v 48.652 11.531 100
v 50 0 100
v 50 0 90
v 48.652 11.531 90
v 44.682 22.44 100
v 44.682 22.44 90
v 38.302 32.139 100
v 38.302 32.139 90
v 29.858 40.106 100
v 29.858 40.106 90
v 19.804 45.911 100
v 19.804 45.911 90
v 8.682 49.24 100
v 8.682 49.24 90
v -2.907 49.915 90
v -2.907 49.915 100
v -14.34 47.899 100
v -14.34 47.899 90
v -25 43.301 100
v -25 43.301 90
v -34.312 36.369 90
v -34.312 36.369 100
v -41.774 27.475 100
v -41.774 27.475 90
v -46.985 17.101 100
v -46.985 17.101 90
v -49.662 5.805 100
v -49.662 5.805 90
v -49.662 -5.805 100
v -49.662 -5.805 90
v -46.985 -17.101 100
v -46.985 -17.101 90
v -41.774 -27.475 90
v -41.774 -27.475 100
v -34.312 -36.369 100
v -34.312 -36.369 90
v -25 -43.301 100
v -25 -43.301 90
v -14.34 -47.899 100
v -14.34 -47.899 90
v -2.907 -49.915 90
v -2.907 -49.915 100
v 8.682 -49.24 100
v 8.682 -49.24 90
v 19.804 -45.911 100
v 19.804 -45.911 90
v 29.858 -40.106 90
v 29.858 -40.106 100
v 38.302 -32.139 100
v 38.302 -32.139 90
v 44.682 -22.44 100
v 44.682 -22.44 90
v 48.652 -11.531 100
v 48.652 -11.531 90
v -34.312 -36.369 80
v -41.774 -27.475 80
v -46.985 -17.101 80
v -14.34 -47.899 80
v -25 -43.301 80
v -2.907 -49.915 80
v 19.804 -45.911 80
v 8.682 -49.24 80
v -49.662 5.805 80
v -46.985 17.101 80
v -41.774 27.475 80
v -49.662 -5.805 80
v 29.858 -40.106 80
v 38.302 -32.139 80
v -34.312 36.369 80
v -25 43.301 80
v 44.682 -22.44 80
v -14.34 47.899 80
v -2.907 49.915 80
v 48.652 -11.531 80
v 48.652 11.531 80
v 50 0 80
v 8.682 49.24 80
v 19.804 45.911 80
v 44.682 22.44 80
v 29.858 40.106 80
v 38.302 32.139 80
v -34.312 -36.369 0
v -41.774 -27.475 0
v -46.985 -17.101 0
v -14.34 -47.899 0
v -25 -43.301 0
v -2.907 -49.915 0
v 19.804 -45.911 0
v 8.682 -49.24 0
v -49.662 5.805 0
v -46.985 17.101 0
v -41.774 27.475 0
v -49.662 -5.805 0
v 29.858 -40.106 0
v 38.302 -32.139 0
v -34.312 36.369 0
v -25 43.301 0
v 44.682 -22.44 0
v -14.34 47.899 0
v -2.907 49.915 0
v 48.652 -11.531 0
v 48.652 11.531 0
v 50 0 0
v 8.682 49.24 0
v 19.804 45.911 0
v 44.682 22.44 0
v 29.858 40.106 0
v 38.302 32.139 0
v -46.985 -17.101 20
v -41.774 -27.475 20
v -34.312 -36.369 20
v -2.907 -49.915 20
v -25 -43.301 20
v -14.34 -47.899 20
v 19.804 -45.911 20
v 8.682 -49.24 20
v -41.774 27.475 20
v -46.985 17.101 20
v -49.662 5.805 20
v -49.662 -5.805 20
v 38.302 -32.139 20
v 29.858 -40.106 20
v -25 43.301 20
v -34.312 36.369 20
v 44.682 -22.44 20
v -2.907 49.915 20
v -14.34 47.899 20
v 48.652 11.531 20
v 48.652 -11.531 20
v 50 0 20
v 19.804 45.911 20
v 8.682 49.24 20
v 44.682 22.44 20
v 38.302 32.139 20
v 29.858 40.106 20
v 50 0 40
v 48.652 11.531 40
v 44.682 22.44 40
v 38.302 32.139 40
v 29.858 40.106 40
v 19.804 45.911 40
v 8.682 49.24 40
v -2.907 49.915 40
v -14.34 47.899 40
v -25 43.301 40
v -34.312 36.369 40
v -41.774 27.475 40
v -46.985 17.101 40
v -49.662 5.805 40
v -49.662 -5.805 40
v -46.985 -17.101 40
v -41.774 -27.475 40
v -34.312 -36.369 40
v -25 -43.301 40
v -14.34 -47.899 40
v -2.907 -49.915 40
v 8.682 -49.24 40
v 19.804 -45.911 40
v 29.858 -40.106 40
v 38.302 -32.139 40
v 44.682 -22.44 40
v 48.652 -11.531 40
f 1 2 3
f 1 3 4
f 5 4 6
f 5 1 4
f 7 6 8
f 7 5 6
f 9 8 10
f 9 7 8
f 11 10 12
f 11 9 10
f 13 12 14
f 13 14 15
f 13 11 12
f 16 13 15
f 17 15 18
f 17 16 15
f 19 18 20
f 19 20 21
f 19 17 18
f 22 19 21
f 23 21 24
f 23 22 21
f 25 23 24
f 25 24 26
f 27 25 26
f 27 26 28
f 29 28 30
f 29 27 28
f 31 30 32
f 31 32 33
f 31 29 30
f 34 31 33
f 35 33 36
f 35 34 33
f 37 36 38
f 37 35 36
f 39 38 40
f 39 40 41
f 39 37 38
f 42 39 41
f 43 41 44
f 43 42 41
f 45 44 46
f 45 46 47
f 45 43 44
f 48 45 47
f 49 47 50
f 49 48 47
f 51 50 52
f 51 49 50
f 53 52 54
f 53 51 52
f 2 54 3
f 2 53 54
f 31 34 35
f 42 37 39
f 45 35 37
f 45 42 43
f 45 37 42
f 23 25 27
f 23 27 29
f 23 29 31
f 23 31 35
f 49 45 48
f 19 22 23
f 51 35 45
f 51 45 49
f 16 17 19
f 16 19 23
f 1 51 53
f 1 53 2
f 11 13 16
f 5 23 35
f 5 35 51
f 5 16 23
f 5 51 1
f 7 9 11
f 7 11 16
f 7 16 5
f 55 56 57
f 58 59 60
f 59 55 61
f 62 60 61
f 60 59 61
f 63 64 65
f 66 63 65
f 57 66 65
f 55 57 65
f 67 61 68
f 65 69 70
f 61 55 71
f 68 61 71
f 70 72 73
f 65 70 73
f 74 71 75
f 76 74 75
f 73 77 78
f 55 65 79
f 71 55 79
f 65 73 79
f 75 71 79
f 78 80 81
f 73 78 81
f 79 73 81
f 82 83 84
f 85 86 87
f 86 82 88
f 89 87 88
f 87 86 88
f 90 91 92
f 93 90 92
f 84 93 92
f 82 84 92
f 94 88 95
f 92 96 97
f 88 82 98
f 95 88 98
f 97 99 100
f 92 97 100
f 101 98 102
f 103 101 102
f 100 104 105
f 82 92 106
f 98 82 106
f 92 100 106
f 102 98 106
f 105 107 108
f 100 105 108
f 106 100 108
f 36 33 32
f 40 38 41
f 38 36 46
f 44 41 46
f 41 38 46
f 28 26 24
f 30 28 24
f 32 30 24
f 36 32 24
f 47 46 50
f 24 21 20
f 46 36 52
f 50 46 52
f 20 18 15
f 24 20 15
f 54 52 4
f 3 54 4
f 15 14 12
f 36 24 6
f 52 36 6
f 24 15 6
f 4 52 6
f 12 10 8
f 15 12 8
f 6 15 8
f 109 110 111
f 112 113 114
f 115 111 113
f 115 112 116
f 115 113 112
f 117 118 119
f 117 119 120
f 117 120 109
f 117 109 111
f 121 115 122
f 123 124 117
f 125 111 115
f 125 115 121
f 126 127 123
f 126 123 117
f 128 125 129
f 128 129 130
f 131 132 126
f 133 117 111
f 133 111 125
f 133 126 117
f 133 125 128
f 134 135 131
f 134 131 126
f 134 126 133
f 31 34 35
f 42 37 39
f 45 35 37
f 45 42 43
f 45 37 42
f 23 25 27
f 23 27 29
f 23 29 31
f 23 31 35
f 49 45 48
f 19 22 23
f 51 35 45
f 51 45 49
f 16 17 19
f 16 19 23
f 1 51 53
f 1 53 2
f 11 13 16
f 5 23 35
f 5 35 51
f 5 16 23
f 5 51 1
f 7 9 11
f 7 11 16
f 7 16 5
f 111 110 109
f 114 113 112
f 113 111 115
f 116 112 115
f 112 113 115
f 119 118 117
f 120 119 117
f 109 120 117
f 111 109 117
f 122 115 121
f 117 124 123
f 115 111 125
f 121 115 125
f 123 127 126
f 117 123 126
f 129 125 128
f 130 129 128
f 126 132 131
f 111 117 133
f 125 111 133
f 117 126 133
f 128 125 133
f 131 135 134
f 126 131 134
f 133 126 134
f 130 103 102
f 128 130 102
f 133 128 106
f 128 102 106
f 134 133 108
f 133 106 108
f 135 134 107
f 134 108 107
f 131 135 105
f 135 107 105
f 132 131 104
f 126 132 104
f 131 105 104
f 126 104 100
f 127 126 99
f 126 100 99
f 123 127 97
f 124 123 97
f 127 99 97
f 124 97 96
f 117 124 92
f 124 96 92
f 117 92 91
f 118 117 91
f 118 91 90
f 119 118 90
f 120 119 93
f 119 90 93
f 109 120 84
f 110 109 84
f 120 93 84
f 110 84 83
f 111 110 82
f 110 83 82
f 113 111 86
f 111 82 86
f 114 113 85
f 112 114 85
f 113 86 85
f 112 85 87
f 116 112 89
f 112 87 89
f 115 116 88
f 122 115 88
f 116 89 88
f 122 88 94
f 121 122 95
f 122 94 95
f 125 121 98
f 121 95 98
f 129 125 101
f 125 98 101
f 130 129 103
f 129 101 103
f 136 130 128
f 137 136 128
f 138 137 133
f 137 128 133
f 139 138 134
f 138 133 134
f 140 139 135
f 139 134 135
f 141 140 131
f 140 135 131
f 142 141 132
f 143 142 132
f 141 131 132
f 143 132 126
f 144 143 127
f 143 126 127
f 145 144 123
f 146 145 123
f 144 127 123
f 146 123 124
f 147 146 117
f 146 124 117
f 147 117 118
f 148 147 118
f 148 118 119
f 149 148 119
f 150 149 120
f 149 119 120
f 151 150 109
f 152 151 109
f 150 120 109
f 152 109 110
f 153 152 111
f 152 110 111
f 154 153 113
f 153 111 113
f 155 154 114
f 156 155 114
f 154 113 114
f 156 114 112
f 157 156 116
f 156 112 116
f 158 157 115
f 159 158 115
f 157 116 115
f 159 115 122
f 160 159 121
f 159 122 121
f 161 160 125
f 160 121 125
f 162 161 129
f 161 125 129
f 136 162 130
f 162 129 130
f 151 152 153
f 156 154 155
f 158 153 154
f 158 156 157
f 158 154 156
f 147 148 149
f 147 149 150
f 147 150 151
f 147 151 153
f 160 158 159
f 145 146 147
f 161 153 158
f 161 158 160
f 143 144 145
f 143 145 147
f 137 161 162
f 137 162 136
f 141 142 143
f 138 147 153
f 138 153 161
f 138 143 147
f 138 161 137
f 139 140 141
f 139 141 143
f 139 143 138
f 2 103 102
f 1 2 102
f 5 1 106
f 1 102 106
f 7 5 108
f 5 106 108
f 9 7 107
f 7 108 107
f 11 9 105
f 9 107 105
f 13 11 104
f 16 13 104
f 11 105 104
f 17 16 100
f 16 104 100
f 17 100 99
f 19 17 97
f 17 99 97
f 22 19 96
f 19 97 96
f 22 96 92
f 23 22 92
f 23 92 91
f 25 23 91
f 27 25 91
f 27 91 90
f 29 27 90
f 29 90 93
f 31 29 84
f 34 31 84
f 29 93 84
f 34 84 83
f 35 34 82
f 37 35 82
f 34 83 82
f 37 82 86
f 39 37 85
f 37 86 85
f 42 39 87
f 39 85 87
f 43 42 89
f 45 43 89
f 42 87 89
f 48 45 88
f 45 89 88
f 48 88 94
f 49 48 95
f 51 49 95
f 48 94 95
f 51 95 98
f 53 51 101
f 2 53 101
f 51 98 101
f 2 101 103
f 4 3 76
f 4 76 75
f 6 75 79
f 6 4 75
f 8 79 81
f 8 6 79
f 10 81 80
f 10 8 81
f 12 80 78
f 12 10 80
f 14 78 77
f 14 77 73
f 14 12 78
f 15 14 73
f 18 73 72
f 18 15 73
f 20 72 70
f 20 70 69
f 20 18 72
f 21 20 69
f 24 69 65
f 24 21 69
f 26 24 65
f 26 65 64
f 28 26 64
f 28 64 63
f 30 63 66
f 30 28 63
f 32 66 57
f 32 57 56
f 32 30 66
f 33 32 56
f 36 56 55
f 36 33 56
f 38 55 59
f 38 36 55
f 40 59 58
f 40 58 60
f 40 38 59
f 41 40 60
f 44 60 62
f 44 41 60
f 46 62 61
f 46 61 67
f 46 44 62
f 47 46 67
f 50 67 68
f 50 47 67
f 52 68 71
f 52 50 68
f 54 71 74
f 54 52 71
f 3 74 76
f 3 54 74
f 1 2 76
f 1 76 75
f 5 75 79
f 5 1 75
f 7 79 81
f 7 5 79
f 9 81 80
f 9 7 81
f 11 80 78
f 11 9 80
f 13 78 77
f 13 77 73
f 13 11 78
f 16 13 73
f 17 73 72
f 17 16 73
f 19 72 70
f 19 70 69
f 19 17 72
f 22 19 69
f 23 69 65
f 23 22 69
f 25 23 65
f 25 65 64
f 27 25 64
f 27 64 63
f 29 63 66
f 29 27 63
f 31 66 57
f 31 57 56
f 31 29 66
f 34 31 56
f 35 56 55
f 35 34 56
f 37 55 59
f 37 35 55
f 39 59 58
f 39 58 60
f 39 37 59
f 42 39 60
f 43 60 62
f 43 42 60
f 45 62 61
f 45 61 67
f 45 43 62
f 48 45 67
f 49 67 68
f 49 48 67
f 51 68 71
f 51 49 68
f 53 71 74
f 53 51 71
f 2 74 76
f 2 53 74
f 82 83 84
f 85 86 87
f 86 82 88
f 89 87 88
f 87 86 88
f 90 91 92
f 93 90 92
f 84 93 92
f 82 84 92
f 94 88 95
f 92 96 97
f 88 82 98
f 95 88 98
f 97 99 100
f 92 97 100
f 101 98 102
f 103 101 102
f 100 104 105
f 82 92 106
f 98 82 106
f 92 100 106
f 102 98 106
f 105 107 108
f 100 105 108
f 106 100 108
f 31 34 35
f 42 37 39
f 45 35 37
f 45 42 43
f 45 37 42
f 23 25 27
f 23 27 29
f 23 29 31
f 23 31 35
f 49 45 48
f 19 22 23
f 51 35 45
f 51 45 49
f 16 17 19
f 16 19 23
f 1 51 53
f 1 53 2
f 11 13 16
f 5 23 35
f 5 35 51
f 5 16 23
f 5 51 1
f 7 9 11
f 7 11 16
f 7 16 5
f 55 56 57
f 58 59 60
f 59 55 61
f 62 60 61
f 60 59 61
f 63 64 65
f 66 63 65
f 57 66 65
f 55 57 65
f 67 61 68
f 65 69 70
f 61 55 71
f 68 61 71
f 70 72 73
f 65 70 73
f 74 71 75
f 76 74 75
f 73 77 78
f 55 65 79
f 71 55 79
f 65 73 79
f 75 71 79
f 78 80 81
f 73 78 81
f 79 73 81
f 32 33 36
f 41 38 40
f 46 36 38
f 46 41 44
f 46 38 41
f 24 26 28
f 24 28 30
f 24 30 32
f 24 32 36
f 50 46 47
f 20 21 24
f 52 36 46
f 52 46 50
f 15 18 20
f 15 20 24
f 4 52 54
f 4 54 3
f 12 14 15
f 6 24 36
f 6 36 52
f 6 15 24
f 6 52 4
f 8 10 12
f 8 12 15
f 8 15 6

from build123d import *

# Parameters (mm, degrees)
F0_R     = 50
F1_DEPTH = 20
F2_R     = 50
F3_DEPTH = 20
F4_DEPTH = 100
F5_DEPTH = 20
F6_DEPTH = 10
F7_DEPTH = 10


with BuildPart() as f1:
    # F0 (on Top) → F1 (new body)
    with BuildSketch(Plane.XY):
        Circle(F0_R)
    extrude(amount=F1_DEPTH)


with BuildPart() as f3:
    # F2 (on face) → F3 (new body)
    with BuildSketch(Plane.XY.offset(20)):
        Circle(F2_R)
    extrude(amount=F3_DEPTH)


with BuildPart() as f4:
    # F0 (on Top) → F4 (new body)
    with BuildSketch(Plane.XY):
        Circle(F0_R)
    extrude(amount=F4_DEPTH)


with BuildPart() as f5:
    # F5 (new): a face of the model
    f5_faces = [f4.part.faces().sort_by_distance(p)[0] for p in [
        (0, 0, 100),
    ]]
    extrude(f5_faces, amount=-F5_DEPTH)


with BuildPart() as f6:
    # F6 (new): a face of the model
    f6_faces = [f5.part.faces().sort_by_distance(p)[0] for p in [
        (0, 0, 100),
    ]]
    extrude(f6_faces, amount=-F6_DEPTH)


with BuildPart() as f7:
    # F7 (new): a face of the model
    f7_faces = [f6.part.faces().sort_by_distance(p)[0] for p in [
        (0, 0, 90),
    ]]
    extrude(f7_faces, amount=F7_DEPTH)


solid = Compound([f1.part, f3.part, f4.part, f5.part, f6.part, f7.part])
